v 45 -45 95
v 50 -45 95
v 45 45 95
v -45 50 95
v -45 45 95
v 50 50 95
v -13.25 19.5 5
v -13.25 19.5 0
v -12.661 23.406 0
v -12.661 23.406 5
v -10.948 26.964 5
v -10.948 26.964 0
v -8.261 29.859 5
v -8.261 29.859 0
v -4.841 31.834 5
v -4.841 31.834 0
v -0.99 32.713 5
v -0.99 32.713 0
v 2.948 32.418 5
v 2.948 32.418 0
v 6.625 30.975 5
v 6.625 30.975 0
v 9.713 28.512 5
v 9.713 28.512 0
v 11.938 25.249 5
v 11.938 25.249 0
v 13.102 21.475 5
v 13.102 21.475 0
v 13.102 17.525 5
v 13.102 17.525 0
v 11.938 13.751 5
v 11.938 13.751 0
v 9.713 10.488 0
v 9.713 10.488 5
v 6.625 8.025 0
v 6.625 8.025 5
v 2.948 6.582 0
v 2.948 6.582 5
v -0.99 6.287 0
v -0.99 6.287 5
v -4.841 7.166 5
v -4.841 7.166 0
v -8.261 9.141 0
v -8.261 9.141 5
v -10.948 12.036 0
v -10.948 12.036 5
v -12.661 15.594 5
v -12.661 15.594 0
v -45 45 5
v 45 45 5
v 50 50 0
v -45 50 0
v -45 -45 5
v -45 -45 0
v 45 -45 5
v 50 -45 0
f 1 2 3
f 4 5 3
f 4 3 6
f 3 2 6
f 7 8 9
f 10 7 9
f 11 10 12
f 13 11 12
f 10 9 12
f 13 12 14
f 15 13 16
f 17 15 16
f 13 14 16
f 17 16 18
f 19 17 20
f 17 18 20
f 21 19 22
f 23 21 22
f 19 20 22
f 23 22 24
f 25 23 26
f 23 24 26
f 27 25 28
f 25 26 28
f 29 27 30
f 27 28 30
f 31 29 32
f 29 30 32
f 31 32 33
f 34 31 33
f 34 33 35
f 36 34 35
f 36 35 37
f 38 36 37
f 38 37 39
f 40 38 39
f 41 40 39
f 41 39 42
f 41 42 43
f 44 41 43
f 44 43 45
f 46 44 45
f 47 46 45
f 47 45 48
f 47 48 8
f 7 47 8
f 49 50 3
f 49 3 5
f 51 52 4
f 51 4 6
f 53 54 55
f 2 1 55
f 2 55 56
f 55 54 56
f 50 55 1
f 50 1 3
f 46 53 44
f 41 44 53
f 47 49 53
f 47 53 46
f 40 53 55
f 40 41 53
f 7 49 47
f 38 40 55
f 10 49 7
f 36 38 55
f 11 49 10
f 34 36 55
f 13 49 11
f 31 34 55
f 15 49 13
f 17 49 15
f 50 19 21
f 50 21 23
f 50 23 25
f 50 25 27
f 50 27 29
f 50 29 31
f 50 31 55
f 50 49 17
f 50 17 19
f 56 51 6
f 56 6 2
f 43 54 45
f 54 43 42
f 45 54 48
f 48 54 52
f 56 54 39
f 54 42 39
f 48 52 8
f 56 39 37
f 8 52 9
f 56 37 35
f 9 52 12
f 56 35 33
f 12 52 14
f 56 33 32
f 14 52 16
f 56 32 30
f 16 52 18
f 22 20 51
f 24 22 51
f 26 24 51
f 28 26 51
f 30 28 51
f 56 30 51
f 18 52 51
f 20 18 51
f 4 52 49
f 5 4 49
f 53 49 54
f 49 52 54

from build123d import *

# Parameters (mm, degrees)
SKETCH1_W           = 100
SKETCH1_H           = 100
BOSS_EXTRUDE1_DEPTH = 5
BOSS_EXTRUDE2_DEPTH = 95
SKETCH3_R           = 13.25
CUT_EXTRUDE1_DEPTH  = 95
CUT_EXTRUDE2_DEPTH  = 123.474487139
SKETCH5_W           = 5
SKETCH5_H           = 95
CUT_EXTRUDE3_DEPTH  = 147.714007511


with BuildPart() as part:
    # Sketch1 → Boss-Extrude1 (new body)
    with BuildSketch(Plane.XY):
        Rectangle(SKETCH1_W, SKETCH1_H)
    extrude(amount=BOSS_EXTRUDE1_DEPTH)

    # Sketch2 → Boss-Extrude2 (add)
    with BuildSketch(Plane.XY.offset(5)):
        Polygon((-50, 50), (50, 50), (50, -50), (45, -50), (45, 45), (-50, 45), align=None)
    extrude(amount=BOSS_EXTRUDE2_DEPTH)

    # Sketch3 → Cut-Extrude1 (cut)
    with BuildSketch(Plane(origin=(0, 0, 0), x_dir=(-1, 0, 0), z_dir=(0, 0, -1))):
        with Locations((0, 19.5)):
            Circle(SKETCH3_R)
    extrude(amount=-CUT_EXTRUDE1_DEPTH, mode=Mode.SUBTRACT)

    # Sketch4 → Cut-Extrude2 (cut, through all)
    with BuildSketch(Plane(origin=(0, 0, 0), x_dir=(-1, 0, 0), z_dir=(0, 0, -1))):
        Polygon((-50, -50), (50, -50), (50, 50), (45, 50), (45, -45), (-50, -45), align=None)
    extrude(amount=-CUT_EXTRUDE2_DEPTH, mode=Mode.SUBTRACT)

    # Sketch5 → Cut-Extrude3 (cut, through all)
    with BuildSketch(Plane(origin=(50, 0, 0), x_dir=(0, 0, -1), z_dir=(1, 0, 0))):
        with Locations((-97.5, 2.5)):
            Rectangle(SKETCH5_W, SKETCH5_H)
    extrude(amount=-CUT_EXTRUDE3_DEPTH, mode=Mode.SUBTRACT)


solid = part.part
